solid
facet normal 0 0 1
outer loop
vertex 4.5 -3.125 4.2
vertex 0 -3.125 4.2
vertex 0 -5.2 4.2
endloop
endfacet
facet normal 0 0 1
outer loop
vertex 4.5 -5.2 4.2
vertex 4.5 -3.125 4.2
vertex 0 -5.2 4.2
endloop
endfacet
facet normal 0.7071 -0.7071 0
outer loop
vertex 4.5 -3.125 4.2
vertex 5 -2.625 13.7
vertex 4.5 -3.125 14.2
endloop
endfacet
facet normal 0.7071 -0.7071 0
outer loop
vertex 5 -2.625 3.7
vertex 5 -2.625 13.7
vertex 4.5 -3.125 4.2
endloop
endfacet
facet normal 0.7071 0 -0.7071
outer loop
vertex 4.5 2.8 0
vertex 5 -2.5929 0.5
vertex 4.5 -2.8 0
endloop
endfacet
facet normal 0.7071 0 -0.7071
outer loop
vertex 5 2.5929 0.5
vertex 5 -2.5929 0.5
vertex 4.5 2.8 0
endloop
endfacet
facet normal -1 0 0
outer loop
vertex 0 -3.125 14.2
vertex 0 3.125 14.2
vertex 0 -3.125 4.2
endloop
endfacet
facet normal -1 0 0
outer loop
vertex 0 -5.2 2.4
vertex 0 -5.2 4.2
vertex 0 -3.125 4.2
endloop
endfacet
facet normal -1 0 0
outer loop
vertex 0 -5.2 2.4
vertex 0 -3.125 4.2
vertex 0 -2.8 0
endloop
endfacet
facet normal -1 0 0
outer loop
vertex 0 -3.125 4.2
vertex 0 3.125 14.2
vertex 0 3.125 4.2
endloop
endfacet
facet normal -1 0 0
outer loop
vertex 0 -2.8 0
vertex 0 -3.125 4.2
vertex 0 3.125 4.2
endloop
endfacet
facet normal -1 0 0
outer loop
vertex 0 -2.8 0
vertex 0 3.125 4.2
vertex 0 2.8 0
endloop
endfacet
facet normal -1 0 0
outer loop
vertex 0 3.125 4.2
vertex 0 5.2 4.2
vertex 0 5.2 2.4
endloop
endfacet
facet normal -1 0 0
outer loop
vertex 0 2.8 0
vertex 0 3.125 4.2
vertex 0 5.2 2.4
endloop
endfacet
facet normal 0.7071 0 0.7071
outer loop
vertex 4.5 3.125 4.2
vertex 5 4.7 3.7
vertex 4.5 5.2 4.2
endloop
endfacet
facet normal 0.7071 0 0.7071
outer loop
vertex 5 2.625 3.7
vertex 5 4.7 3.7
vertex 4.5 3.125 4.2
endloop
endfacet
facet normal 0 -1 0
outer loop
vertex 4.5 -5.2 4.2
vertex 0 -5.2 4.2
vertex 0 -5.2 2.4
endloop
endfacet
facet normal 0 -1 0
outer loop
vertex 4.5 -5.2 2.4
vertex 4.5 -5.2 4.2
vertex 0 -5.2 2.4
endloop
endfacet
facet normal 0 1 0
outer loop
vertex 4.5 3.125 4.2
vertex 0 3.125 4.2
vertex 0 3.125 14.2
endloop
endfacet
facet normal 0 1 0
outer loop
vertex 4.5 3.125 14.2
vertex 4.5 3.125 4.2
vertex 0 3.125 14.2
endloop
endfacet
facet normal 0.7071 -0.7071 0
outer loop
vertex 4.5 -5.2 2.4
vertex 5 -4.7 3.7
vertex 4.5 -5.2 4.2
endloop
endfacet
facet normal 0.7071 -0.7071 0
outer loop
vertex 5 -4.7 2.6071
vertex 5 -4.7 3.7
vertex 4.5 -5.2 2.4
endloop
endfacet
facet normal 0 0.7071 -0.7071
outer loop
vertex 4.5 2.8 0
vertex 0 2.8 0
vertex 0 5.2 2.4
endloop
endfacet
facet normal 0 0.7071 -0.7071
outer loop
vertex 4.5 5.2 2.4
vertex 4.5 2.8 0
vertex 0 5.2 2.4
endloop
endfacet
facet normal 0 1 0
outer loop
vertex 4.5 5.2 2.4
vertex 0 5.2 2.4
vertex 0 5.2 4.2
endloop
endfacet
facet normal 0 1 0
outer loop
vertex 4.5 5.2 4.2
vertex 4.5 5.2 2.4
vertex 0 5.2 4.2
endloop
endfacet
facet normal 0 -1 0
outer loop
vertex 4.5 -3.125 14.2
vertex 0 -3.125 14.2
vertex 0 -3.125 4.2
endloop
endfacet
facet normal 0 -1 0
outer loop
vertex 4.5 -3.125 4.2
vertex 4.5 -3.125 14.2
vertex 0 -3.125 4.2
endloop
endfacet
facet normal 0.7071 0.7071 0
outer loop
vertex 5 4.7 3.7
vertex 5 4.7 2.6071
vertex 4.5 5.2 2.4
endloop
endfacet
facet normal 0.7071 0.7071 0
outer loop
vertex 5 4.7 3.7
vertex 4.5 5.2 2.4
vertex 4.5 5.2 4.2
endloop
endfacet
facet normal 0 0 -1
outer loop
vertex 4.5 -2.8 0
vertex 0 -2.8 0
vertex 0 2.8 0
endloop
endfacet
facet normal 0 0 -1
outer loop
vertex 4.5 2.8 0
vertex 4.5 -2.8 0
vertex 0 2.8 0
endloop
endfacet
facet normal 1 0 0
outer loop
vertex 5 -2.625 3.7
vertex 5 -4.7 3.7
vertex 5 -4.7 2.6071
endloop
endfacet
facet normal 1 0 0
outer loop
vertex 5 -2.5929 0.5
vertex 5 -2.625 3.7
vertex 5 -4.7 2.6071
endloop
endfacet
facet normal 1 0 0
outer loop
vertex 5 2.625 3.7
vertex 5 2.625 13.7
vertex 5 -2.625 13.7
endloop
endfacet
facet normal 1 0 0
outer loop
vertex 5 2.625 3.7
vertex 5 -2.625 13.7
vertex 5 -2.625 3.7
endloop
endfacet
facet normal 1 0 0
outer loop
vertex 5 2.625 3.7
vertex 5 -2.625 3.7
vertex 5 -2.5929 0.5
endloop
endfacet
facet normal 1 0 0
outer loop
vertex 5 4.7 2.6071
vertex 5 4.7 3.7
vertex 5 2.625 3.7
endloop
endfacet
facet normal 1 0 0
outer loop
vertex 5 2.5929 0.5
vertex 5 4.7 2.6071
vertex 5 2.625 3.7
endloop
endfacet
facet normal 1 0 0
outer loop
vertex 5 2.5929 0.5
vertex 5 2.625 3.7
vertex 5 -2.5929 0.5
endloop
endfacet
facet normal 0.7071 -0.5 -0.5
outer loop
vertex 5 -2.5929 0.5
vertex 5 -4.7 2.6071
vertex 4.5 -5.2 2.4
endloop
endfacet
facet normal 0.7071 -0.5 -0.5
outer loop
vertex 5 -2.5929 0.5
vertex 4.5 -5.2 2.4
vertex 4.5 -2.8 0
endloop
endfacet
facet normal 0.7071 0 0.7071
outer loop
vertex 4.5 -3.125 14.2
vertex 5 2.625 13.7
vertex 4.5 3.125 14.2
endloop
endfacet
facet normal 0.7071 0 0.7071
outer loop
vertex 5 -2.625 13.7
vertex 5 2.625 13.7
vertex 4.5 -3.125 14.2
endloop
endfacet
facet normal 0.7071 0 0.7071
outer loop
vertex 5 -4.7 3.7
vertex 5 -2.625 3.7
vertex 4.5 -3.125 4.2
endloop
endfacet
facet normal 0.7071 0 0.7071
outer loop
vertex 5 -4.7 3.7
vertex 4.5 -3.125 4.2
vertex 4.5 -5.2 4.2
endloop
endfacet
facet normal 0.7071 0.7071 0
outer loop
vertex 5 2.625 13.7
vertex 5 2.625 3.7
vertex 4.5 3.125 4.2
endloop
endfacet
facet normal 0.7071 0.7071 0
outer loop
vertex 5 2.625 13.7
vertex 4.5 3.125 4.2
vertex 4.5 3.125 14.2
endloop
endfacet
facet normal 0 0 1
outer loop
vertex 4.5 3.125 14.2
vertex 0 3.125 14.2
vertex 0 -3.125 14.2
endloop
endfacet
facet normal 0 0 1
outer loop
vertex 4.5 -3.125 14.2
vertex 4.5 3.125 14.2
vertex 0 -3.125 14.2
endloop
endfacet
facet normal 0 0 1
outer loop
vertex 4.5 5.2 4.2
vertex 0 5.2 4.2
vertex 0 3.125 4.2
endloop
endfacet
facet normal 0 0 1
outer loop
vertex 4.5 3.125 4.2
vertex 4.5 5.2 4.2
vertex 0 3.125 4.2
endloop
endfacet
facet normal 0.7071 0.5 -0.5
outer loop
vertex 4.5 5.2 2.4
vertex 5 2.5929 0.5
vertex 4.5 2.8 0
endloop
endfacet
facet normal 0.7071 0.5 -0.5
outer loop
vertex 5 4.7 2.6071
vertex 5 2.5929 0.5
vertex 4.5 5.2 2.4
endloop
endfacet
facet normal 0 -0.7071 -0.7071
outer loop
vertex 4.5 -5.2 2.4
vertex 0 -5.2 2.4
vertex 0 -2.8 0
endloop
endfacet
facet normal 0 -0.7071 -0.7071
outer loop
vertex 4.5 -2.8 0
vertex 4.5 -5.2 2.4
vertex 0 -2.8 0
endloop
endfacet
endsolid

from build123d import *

# Parameters (mm, degrees)
BOSS_EXTRUDE1_DEPTH = 5
CHAMFER1_SIZE       = 0.5


with BuildPart() as part:
    # Sketch2 → Boss-Extrude1 (new body)
    with BuildSketch(Plane(origin=(0, 0, 0), x_dir=(0, 0, -1), z_dir=(1, 0, 0))):
        Polygon((-4.2, 3.125), (-14.2, 3.125), (-14.2, -3.125), (-4.2, -3.125), (-4.2, -5.2), (-2.4, -5.2), (0, -2.8), (0, 2.8), (-2.4, 5.2), (-4.2, 5.2), align=None)
    extrude(amount=BOSS_EXTRUDE1_DEPTH)

    # Chamfer1
    chamfer1_edges = [part.edges().sort_by_distance(p)[0] for p in [
        (5, 0, 14.2),
        (5, -3.125, 9.2),
        (5, -4.1625, 4.2),
        (5, -5.2, 3.3),
        (5, -4, 1.2),
        (5, 0, 0),
        (5, 4, 1.2),
        (5, 5.2, 3.3),
        (5, 4.1625, 4.2),
        (5, 3.125, 9.2),
    ]]
    chamfer(chamfer1_edges, length=CHAMFER1_SIZE)


solid = part.part
